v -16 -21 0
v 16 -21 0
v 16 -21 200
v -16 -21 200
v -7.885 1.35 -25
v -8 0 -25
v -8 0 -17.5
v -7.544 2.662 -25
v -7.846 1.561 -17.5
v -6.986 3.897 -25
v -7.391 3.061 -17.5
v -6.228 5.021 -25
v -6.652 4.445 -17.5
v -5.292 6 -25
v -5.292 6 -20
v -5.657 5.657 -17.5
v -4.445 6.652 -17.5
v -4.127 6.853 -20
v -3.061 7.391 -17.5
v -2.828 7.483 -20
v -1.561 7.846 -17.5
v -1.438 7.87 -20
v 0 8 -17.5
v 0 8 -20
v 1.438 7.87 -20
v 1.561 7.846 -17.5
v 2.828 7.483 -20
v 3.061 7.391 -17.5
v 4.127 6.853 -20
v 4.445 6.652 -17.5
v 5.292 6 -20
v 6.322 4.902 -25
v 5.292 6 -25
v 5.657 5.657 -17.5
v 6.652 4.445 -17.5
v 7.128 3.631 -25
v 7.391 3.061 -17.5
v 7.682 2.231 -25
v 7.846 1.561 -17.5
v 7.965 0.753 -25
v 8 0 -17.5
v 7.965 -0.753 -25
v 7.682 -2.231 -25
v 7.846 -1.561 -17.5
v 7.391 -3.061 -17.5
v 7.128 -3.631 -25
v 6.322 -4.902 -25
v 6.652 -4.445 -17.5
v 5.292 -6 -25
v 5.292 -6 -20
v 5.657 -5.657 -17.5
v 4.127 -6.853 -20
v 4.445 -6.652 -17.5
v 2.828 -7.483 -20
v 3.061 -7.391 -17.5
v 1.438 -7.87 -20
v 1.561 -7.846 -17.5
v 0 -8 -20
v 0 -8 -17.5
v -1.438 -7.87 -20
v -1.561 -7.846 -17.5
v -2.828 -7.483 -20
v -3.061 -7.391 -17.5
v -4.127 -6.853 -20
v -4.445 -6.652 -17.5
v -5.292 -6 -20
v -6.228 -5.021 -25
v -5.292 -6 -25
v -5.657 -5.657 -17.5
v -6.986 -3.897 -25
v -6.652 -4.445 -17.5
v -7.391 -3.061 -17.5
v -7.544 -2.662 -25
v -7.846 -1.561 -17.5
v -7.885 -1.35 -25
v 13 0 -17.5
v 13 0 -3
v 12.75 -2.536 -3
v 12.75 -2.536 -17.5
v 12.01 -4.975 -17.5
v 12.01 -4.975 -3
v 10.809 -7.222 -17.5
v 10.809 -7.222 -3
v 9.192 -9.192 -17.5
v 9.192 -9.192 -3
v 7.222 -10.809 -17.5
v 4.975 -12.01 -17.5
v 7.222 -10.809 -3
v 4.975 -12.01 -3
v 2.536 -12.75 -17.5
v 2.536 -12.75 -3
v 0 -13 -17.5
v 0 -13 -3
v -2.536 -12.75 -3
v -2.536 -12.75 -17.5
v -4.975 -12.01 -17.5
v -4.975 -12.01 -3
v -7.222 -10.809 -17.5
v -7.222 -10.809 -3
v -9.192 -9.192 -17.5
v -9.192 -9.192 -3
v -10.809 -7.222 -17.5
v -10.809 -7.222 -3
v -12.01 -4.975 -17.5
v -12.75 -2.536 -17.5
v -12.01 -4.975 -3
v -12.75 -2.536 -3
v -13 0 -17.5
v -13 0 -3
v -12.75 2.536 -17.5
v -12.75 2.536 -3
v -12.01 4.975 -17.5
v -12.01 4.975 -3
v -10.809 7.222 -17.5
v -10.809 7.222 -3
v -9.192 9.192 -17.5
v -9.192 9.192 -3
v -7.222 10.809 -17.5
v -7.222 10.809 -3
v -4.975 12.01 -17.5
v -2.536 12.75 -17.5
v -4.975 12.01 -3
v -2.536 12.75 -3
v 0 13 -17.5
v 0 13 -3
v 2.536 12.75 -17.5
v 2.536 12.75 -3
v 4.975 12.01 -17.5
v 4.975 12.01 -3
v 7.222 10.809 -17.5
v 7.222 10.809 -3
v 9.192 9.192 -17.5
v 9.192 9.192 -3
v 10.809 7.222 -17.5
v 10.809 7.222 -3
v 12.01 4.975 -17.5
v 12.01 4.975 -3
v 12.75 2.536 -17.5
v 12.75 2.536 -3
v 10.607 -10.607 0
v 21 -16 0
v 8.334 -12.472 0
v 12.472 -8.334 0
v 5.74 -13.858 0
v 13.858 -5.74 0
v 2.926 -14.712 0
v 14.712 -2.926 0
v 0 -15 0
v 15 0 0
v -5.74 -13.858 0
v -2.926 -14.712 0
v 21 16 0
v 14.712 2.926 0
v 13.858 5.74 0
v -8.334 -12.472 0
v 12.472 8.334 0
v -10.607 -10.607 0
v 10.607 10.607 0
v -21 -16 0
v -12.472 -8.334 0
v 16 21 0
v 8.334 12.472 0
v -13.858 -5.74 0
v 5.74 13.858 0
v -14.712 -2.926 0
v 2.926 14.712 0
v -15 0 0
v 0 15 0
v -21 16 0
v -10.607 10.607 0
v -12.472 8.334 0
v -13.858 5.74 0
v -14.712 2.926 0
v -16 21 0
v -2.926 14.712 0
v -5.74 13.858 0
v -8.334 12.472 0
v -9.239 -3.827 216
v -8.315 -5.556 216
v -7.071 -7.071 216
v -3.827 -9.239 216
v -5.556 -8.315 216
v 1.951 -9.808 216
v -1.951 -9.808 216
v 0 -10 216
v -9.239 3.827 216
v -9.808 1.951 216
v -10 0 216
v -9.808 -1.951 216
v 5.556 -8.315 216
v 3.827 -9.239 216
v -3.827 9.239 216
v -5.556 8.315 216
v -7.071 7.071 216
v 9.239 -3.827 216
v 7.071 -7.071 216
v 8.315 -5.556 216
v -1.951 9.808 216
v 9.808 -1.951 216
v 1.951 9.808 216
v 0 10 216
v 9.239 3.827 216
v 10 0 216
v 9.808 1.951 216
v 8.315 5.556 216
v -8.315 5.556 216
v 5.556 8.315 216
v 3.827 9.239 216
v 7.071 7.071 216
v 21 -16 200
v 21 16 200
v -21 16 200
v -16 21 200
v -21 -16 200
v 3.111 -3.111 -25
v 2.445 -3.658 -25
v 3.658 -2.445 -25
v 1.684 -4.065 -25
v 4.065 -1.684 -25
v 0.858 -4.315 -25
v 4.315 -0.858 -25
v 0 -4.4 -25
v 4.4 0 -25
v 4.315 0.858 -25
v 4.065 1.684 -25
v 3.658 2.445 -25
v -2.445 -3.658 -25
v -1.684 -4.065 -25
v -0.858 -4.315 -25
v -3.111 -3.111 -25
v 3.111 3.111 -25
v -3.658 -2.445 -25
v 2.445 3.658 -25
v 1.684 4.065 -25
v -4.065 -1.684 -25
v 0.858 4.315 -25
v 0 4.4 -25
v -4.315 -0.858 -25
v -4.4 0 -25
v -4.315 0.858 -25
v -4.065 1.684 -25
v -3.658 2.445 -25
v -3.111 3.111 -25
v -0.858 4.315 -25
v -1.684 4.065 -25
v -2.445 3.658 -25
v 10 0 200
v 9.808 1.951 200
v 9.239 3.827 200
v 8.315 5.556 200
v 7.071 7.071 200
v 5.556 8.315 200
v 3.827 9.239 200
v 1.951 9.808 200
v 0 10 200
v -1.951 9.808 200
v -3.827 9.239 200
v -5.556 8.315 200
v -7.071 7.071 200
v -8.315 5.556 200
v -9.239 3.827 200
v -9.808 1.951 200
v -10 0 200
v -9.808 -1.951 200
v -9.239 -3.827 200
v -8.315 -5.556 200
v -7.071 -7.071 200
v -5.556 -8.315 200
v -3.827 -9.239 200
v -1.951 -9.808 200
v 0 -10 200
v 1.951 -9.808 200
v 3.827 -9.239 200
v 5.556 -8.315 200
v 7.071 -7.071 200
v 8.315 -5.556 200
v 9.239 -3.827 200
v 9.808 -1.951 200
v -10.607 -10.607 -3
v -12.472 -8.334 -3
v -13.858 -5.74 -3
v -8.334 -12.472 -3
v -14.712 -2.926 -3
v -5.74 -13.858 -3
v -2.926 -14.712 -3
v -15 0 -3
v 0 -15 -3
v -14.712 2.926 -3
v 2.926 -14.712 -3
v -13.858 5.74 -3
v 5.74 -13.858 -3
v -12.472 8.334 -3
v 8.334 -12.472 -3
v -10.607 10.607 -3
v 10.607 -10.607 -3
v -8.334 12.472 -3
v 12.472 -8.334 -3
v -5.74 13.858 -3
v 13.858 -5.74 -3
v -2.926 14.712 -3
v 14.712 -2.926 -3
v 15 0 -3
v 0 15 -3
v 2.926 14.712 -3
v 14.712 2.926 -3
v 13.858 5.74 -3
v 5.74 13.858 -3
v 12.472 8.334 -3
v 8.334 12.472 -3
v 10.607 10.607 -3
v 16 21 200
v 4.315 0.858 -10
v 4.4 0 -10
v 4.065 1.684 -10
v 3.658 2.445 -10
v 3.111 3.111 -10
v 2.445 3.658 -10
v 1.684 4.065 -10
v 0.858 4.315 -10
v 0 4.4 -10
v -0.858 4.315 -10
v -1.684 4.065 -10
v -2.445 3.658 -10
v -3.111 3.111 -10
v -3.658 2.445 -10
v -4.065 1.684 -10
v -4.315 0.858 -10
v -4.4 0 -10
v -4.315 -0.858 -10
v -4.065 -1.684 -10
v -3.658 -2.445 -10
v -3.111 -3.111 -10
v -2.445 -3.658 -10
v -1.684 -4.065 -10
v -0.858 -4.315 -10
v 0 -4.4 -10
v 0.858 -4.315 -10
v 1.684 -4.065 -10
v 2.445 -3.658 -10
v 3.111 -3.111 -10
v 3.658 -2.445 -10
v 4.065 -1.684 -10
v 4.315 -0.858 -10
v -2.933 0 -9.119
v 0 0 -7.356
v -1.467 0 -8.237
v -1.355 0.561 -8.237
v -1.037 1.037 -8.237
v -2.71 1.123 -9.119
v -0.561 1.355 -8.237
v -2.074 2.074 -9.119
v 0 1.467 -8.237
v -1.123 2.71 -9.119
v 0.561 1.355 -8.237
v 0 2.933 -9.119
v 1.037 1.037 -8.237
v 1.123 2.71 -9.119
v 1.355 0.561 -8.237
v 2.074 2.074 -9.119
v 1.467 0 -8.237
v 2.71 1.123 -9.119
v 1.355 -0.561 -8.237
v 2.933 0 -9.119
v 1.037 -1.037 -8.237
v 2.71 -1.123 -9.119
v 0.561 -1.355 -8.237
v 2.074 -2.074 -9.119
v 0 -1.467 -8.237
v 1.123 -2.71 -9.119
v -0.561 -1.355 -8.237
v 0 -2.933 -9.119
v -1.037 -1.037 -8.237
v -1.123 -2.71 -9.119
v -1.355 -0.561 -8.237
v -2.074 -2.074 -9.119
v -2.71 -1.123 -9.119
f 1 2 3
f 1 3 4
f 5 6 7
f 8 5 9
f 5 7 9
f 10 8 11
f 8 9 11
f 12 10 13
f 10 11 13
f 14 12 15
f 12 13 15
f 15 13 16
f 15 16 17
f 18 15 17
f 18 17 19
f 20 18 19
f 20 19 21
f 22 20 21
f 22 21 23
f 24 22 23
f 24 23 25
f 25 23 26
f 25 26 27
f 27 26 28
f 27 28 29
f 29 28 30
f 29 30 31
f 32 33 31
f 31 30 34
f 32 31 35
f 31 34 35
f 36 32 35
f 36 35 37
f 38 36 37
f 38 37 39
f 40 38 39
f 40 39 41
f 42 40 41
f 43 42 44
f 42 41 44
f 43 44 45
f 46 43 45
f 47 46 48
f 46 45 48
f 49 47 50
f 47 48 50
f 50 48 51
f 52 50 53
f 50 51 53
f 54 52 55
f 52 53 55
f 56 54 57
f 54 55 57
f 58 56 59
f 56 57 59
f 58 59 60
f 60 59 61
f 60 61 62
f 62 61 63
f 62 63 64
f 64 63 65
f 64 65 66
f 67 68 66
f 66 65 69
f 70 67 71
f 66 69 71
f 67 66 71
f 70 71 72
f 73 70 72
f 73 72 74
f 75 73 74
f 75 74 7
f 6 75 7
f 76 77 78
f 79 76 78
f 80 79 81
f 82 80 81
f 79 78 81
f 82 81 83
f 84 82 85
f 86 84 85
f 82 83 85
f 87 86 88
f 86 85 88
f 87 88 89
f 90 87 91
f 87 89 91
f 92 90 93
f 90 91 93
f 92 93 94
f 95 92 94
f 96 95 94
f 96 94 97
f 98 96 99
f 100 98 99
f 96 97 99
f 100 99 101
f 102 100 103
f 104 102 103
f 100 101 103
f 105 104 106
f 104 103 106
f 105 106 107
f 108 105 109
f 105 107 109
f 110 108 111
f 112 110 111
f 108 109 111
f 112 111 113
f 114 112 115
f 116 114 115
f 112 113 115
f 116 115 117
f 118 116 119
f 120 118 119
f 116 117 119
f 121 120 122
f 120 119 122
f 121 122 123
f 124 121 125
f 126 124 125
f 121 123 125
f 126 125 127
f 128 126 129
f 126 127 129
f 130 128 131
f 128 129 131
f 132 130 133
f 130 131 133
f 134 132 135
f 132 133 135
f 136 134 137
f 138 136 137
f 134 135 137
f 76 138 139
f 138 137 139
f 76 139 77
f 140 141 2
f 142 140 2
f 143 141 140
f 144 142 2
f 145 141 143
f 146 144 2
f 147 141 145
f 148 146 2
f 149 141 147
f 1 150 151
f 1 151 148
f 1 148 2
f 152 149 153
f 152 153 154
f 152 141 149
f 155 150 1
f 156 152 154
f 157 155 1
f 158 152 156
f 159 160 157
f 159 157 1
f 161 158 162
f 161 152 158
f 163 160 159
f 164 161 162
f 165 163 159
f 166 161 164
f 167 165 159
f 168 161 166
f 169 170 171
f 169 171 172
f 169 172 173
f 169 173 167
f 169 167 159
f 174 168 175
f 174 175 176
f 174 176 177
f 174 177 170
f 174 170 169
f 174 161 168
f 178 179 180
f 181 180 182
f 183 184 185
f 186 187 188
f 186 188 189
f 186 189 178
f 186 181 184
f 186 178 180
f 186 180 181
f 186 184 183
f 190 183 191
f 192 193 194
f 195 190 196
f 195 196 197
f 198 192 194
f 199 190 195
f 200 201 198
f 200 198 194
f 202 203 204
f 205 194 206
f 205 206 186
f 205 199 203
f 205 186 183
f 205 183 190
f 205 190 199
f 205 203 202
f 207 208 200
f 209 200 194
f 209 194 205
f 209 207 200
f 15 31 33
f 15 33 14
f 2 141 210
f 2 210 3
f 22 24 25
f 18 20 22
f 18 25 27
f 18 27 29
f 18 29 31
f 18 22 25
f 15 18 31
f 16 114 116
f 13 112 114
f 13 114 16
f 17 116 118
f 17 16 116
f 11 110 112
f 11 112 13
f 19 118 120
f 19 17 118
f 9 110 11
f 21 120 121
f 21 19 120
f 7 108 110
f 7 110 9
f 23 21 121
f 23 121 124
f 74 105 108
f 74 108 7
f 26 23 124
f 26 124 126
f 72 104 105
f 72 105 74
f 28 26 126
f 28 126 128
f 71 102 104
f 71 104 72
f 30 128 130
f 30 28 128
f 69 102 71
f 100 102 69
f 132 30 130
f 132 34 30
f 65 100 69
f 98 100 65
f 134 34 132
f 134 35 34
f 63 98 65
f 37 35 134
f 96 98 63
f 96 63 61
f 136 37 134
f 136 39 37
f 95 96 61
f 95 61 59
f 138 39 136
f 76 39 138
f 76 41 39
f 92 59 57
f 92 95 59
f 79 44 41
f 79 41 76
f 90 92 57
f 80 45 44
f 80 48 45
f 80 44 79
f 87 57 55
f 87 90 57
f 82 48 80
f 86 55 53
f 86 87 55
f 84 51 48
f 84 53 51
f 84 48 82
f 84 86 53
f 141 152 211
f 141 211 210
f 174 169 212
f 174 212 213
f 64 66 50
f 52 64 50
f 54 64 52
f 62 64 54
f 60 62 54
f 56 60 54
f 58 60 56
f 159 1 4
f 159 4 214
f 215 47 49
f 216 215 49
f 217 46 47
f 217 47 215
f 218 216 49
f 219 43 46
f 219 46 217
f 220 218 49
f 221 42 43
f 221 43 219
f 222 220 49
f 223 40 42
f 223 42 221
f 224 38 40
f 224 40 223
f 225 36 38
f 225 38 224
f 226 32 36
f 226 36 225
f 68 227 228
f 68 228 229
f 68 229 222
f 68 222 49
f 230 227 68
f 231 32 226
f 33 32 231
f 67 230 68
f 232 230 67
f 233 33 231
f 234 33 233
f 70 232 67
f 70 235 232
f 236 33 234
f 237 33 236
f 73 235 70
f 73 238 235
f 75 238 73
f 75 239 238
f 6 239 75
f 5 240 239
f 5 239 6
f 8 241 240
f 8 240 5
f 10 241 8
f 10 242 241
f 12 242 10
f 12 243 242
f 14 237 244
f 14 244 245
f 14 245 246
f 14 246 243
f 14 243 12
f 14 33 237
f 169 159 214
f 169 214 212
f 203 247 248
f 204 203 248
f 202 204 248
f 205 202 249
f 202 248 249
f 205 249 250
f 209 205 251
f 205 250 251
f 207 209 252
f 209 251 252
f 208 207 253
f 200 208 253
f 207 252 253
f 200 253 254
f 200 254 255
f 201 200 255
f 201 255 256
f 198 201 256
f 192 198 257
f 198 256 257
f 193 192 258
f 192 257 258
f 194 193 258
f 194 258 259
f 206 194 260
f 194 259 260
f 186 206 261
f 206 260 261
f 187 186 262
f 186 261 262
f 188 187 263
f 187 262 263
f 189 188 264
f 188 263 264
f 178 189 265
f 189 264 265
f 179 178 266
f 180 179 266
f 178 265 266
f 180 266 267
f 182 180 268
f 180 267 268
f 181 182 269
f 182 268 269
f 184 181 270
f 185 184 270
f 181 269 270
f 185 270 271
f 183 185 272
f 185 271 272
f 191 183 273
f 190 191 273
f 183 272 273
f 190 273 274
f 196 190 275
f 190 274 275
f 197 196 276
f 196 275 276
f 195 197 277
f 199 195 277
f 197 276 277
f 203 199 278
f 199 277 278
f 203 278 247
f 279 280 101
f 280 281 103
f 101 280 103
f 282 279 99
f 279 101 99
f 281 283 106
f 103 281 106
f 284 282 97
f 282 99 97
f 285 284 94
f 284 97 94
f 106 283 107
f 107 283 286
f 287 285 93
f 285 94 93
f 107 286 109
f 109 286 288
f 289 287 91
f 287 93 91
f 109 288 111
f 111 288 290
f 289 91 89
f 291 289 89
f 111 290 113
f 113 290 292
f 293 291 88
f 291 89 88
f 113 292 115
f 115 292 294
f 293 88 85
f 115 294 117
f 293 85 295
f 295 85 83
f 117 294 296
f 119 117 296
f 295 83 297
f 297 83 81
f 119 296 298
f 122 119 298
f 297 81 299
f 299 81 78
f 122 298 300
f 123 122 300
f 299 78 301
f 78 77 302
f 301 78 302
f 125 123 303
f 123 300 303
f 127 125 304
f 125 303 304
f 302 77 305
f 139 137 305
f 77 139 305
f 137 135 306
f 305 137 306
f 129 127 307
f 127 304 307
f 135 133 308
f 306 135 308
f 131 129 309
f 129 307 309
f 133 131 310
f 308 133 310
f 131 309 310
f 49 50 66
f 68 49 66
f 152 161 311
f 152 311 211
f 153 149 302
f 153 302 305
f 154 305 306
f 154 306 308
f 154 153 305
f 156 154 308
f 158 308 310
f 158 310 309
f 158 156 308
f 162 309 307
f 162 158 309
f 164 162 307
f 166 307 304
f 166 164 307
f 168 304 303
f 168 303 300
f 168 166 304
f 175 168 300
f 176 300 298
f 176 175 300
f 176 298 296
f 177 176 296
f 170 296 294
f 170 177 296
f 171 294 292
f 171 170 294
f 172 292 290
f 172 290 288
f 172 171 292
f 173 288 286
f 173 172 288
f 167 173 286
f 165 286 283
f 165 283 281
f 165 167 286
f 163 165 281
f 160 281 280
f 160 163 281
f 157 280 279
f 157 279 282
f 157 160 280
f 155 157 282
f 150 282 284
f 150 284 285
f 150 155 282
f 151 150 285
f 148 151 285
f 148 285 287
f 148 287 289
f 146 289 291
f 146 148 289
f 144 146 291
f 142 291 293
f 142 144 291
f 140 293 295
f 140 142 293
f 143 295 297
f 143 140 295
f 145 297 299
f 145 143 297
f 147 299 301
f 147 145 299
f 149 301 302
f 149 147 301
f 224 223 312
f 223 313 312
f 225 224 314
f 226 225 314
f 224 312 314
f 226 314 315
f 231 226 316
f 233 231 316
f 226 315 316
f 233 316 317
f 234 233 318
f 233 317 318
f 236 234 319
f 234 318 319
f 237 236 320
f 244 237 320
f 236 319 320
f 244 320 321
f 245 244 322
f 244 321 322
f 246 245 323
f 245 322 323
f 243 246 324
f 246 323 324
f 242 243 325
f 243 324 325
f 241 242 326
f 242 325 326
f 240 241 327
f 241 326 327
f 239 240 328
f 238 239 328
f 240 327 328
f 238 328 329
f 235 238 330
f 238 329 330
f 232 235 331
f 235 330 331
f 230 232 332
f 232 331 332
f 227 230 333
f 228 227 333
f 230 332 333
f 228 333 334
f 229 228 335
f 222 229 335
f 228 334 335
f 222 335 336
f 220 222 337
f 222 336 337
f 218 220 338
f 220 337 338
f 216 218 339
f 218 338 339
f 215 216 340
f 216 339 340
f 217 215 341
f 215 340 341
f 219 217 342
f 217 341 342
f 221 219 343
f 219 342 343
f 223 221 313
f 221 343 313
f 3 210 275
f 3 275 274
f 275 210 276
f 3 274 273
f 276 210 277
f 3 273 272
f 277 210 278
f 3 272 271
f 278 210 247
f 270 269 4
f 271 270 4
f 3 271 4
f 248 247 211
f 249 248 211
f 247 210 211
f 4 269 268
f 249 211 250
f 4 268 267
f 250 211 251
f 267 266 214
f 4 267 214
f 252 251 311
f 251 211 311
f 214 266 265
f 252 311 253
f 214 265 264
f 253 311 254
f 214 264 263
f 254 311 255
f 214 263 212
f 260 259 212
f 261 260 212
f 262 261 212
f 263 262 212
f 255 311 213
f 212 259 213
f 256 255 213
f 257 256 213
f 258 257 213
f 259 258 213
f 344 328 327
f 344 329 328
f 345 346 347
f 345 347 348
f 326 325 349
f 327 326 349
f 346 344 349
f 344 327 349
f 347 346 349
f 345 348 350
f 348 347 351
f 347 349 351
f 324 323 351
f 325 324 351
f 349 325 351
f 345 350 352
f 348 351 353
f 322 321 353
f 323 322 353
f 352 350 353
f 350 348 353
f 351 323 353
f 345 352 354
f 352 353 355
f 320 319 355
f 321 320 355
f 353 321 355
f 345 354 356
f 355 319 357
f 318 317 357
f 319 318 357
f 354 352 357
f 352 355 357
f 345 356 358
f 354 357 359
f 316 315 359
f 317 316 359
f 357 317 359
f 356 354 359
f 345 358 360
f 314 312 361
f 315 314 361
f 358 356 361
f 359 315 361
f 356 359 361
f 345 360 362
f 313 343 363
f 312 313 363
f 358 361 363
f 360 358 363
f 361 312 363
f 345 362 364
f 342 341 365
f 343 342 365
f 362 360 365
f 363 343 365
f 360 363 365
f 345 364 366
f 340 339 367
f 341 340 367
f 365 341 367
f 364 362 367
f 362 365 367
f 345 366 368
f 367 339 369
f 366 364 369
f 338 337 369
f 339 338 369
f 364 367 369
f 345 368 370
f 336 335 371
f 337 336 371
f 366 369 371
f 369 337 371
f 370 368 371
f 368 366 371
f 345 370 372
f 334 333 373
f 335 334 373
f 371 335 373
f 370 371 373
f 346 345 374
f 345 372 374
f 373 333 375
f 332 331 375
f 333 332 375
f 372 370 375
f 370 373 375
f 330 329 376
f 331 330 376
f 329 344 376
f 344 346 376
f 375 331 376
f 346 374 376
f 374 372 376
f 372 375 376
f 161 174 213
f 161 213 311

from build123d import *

# Parameters (mm, degrees)
EXTRUDE_1_DEPTH     = 200
SKETCH_2_R          = 15
EXTRUDE_2_DEPTH     = 3
SKETCH_3_R          = 13
EXTRUDE_3_DEPTH     = 14.5
SKETCH_4_R          = 8
EXTRUDE_4_DEPTH     = 7.5
SKETCH_5_R          = 10
EXTRUDE_5_DEPTH     = 16
CUT_EXTRUDE_START   = -5
CUT_EXTRUDE_1_DEPTH = 5
M10X1_25_1_D        = 8.8
M10X1_25_1_DEPTH    = 15
M10X1_25_1_TIP      = 2.643786724


with BuildPart() as part:
    # 스케치1 → 보스-돌출1 (new body)
    with BuildSketch(Plane.XY):
        Polygon((-21, 16), (-16, 21), (16, 21), (21, 16), (21, -16), (16, -21), (-16, -21), (-21, -16), align=None)
    extrude(amount=EXTRUDE_1_DEPTH)

    # 스케치2 → 보스-돌출2 (add)
    with BuildSketch(Plane.XY):
        Circle(SKETCH_2_R)
    extrude(amount=-EXTRUDE_2_DEPTH)

    # 스케치3 → 보스-돌출3 (add)
    with BuildSketch(Plane(origin=(0, 0, -3), x_dir=(-1, 0, 0), z_dir=(0, 0, -1))):
        with Locations(Location((0, 0, 0), (0, 0, 180))):
            Circle(SKETCH_3_R)
    extrude(amount=EXTRUDE_3_DEPTH)

    # 스케치4 → 보스-돌출4 (add)
    with BuildSketch(Plane(origin=(0, 0, -17.5), x_dir=(-1, 0, 0), z_dir=(0, 0, -1))):
        Circle(SKETCH_4_R)
    extrude(amount=EXTRUDE_4_DEPTH)

    # 스케치5 → 보스-돌출5 (add)
    with BuildSketch(Plane.XY.offset(200)):
        Circle(SKETCH_5_R)
    extrude(amount=EXTRUDE_5_DEPTH)

    # 스케치6 → 컷-돌출1 (cut)
    with BuildSketch(Plane(origin=(0, 0, -25), x_dir=(-1, 0, 0), z_dir=(0, 0, -1)).offset(CUT_EXTRUDE_START)):
        with BuildLine():
            Line((-5.291502622, 6), (5.291502622, 6))
            ThreePointArc((5.291502622, 6), (0, 8), (-5.291502622, 6))
        make_face()
        with BuildLine():
            Line((-5.291502622, -6), (5.291502622, -6))
            ThreePointArc((5.291502622, -6), (0, -8), (-5.291502622, -6))
        make_face()
    extrude(amount=CUT_EXTRUDE_1_DEPTH, mode=Mode.SUBTRACT)

    # M10x1.25 탭을 위한 탭 드릴1
    with Locations(Plane(origin=(0, 0, -25), x_dir=(-1, 0, 0), z_dir=(0, 0, -1))):
        with Locations((0, 0)):
            Hole(M10X1_25_1_D / 2, depth=M10X1_25_1_DEPTH)
            with Locations((0, 0, -(M10X1_25_1_DEPTH + M10X1_25_1_TIP / 2))):  # 118° drill point
                Cone(0, M10X1_25_1_D / 2, M10X1_25_1_TIP, mode=Mode.SUBTRACT)


solid = part.part
